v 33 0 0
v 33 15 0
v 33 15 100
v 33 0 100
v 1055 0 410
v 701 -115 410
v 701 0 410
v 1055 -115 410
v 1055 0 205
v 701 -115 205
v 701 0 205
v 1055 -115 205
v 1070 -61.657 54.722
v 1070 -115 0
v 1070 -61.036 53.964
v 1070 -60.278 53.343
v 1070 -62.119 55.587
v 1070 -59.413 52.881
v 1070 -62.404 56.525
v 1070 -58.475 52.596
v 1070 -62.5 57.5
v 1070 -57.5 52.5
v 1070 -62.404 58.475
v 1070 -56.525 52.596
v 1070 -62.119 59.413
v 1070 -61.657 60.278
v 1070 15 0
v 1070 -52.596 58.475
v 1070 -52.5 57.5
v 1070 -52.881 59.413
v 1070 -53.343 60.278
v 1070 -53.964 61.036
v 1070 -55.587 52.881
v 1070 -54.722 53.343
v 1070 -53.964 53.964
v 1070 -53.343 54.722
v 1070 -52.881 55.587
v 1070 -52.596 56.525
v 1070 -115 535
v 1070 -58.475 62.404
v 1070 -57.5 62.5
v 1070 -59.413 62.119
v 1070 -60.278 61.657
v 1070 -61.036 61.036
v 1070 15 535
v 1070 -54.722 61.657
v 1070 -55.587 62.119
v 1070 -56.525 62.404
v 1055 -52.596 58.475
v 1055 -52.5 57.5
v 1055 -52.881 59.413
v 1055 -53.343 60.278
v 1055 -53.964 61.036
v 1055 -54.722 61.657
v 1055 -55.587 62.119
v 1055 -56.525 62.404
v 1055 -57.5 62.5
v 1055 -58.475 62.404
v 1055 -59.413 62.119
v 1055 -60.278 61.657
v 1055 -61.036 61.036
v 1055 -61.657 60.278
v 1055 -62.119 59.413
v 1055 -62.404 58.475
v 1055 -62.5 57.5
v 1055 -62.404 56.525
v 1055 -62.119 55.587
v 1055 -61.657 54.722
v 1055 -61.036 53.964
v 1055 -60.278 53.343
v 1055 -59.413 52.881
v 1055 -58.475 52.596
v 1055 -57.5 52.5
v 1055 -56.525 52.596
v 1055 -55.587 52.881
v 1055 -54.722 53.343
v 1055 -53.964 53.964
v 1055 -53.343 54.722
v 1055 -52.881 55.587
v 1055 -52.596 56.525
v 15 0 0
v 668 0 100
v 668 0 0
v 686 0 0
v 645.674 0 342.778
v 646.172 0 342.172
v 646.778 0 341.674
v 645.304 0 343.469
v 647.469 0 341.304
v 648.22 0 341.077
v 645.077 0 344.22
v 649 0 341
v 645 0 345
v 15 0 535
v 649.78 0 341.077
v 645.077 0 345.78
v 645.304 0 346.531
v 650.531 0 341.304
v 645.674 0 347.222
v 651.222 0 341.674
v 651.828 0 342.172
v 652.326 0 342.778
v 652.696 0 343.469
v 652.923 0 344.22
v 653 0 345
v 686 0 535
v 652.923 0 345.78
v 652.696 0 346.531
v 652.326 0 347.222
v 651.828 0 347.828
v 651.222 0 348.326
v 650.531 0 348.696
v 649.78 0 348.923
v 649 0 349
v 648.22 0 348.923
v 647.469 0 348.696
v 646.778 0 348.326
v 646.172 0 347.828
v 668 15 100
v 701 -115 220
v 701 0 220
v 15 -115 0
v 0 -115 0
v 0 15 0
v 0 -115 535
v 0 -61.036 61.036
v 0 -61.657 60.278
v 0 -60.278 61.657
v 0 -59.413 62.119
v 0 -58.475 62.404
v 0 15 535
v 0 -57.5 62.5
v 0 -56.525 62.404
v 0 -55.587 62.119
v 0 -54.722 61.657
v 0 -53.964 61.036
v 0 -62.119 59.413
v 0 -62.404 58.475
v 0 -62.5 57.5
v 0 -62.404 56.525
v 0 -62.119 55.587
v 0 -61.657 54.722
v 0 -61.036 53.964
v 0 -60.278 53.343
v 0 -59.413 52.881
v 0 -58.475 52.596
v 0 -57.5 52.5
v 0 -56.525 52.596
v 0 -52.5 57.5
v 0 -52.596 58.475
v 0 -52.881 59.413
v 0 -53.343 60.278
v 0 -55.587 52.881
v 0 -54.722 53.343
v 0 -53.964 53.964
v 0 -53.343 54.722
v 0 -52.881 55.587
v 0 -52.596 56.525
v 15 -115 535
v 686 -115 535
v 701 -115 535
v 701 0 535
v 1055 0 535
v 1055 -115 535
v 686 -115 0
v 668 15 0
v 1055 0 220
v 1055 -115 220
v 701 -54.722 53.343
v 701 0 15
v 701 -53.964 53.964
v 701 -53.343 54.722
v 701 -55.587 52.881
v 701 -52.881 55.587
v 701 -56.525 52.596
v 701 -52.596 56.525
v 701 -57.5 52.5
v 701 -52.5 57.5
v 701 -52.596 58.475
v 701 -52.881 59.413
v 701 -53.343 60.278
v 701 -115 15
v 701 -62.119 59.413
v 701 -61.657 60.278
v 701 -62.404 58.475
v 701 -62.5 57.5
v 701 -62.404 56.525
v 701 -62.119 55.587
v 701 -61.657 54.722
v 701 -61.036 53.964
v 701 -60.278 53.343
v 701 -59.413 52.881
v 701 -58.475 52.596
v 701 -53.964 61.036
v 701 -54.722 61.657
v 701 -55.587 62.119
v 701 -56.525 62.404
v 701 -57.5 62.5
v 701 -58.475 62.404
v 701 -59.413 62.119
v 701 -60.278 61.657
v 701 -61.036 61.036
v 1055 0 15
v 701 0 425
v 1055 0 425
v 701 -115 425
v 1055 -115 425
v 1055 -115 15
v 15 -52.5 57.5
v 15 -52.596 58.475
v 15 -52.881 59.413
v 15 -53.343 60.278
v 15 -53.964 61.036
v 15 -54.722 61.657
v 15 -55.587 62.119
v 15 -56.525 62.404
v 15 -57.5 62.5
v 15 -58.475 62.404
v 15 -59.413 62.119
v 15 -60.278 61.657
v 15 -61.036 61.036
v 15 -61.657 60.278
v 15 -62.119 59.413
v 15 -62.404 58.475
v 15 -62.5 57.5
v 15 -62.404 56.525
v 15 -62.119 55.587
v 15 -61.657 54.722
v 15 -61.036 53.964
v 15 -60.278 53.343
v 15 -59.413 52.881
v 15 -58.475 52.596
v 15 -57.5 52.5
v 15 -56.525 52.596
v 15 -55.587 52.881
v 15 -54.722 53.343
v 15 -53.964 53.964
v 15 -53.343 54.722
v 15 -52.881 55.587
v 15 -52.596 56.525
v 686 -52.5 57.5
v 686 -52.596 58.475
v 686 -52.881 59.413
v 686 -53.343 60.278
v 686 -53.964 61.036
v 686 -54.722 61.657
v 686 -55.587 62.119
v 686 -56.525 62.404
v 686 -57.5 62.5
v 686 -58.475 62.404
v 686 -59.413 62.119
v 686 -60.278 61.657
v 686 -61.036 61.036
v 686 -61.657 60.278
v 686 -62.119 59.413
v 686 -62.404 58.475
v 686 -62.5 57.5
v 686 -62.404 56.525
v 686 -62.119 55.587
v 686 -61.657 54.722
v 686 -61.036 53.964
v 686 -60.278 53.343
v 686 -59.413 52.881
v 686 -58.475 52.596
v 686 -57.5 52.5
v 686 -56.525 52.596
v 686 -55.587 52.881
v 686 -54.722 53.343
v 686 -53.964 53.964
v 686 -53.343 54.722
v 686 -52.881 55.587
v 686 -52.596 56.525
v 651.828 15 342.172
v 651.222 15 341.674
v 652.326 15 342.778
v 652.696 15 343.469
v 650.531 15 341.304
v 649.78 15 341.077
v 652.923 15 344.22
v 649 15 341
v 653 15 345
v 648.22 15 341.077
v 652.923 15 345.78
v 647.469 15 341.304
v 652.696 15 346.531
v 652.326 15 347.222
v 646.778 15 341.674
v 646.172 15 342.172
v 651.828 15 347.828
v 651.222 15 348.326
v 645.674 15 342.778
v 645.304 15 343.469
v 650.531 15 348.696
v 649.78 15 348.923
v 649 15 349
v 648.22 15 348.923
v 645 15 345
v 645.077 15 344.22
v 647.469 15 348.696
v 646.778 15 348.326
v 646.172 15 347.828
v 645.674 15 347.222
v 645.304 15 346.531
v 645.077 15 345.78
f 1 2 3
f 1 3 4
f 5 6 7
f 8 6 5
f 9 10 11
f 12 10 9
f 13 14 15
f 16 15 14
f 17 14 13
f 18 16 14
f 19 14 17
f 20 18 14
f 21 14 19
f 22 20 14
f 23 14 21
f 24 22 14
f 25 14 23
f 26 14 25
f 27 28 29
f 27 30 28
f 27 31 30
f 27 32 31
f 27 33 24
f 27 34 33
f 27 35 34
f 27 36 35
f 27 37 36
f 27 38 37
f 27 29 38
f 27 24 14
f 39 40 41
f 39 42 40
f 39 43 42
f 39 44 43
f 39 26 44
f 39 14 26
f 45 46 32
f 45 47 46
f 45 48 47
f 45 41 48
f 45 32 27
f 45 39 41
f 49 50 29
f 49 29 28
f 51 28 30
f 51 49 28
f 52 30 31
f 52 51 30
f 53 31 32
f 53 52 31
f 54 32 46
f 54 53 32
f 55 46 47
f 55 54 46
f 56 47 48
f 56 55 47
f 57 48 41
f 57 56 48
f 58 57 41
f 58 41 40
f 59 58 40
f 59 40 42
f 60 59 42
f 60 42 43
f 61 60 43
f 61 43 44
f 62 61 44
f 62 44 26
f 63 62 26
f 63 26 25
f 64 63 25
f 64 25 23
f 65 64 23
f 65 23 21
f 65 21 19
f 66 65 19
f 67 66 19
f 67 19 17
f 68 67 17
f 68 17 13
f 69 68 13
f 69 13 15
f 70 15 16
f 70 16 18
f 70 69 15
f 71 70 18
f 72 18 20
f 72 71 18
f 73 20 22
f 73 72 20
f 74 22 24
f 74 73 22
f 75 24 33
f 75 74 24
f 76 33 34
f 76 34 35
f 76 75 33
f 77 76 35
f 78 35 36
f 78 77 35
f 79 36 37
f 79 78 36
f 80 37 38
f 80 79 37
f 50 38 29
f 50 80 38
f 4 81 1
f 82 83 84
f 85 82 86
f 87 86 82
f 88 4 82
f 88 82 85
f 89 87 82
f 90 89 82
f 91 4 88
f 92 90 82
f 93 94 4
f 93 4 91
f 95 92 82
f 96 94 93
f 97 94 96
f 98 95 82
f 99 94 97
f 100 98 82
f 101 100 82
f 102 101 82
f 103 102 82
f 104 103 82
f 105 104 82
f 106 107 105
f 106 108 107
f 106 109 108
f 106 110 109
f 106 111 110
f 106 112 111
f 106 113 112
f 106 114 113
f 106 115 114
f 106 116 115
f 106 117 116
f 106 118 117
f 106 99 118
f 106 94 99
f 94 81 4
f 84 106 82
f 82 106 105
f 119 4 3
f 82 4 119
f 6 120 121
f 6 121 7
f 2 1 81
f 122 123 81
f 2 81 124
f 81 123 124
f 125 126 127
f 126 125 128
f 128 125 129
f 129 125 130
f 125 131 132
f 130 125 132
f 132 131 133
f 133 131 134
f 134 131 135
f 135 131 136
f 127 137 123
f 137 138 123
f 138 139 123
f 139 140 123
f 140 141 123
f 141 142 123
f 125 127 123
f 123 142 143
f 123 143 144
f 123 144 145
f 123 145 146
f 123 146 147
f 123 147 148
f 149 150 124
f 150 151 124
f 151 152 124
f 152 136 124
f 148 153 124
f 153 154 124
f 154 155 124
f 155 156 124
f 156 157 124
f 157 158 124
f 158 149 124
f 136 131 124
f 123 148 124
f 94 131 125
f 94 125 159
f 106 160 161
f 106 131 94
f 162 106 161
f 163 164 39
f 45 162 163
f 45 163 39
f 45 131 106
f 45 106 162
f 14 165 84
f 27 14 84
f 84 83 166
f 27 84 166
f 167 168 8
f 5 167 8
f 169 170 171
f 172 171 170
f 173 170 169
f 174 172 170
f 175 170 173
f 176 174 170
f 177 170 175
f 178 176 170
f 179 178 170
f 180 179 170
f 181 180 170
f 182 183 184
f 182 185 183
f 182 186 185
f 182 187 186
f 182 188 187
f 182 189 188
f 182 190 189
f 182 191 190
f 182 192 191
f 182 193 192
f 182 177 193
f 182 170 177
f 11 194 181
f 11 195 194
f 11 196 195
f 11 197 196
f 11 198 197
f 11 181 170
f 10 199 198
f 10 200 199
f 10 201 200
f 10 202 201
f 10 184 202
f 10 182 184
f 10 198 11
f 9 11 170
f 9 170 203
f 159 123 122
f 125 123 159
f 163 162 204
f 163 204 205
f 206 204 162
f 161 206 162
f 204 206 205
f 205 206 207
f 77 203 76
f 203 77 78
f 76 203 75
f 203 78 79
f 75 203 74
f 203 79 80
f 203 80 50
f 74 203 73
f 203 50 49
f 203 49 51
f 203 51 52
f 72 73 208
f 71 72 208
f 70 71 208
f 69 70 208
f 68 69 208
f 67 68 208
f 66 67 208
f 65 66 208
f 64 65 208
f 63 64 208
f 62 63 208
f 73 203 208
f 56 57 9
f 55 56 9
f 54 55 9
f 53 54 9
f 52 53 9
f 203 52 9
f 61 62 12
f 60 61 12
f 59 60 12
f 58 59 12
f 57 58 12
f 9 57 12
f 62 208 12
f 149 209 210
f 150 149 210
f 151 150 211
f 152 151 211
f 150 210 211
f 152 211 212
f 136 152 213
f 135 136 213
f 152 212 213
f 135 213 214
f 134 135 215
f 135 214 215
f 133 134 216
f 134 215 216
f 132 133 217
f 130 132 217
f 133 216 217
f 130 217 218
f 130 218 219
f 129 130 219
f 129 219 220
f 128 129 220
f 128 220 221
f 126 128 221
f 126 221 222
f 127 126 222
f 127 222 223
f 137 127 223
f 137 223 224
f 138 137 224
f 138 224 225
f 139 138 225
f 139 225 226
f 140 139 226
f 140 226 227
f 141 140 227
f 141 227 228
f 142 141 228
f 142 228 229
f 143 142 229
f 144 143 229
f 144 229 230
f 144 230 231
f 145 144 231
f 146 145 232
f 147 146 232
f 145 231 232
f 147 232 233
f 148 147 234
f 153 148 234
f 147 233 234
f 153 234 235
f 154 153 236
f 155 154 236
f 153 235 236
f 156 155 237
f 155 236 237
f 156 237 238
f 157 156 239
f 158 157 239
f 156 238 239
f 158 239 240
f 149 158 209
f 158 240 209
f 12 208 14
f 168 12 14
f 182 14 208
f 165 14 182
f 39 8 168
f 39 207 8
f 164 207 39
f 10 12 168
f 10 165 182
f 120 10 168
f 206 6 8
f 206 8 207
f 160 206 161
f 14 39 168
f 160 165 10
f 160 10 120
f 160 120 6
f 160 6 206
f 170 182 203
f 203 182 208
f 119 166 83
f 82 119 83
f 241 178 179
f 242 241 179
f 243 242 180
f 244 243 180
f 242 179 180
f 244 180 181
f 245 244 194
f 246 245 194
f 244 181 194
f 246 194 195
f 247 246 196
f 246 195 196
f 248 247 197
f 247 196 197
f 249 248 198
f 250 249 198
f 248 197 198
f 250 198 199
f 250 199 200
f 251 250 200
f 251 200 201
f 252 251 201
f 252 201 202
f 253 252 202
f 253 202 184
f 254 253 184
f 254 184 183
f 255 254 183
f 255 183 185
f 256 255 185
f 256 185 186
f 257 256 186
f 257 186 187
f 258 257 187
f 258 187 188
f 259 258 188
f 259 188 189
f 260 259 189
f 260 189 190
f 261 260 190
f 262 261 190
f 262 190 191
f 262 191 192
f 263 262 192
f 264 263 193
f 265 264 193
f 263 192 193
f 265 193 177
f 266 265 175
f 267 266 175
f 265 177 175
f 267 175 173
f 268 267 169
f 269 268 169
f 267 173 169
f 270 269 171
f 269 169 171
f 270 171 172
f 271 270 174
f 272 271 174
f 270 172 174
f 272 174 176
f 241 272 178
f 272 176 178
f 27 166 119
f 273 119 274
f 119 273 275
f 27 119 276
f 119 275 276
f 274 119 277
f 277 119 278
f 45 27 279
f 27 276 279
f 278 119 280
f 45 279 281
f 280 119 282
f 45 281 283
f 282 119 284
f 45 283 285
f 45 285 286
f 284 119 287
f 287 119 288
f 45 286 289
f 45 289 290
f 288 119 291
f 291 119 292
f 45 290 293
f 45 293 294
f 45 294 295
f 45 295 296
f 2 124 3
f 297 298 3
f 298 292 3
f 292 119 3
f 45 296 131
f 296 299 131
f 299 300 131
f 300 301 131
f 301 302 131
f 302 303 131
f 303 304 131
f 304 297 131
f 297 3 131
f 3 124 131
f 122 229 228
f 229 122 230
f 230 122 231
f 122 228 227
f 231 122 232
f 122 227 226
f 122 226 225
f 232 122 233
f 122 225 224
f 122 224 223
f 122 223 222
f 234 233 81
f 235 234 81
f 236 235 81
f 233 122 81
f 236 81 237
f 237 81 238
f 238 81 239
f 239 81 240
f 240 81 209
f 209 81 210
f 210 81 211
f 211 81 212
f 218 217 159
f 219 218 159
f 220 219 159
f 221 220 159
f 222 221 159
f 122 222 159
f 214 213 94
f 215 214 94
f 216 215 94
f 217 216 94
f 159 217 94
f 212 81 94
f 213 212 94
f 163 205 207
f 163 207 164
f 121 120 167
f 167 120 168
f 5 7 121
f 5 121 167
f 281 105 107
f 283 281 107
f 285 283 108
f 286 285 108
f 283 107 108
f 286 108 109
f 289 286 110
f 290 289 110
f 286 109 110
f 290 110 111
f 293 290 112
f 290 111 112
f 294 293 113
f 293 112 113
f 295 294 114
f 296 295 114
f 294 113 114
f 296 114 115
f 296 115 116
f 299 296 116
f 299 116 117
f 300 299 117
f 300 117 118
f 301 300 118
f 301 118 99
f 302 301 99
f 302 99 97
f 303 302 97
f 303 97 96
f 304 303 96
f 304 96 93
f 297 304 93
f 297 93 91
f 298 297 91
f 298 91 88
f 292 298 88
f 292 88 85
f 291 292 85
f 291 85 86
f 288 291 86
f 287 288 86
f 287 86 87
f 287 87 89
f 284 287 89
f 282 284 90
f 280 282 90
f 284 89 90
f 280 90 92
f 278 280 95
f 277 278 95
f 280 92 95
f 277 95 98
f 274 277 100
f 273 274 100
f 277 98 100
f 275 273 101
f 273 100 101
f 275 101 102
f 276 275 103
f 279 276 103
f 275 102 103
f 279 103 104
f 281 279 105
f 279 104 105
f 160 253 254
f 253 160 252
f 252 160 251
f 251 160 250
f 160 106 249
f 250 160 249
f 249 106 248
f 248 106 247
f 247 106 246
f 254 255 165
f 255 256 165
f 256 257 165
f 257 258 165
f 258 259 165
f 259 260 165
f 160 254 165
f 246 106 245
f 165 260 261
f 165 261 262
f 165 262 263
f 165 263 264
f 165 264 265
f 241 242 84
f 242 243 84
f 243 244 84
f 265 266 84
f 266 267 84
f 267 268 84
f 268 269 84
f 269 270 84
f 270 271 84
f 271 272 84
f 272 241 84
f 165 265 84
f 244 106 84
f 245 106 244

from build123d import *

# Parameters (mm, degrees)
F0_W      = 701
F0_H      = 553
F1_DEPTH  = 15
F3_DEPTH  = 115
F5_D      = 10
F6_W      = 130
F6_H      = 553
F6_R      = 5
F7_DEPTH  = 369
F8_W      = 354
F8_H      = 113
F8_H_2    = 190
F9_DEPTH  = 115
F10_W     = 1070
F10_H     = 130
F11_DEPTH = 18
F12_W     = 635
F12_H     = 15
F13_DEPTH = 100
F15_D     = 8


with BuildPart() as f1:
    # F0 (on Front) → F1 (new body)
    with BuildSketch(Plane.XZ):
        with Locations((350.5, 276.5)):
            Rectangle(F0_W, F0_H)
    extrude(amount=-F1_DEPTH)

    # F2 (on face) → F3 (join)
    with BuildSketch(Plane.XZ):
        Polygon((0, 553), (0, 0), (15, 0), (15, 538), (686, 538), (686, 0), (701, 0), (701, 553), align=None)
    extrude(amount=F3_DEPTH)

    # F5 (through all)
    with Locations(Plane(origin=(0, 0, 0), x_dir=(0, -1, 0), z_dir=(-1, 0, 0))):
        with Locations((57.5, 57.5)):
            Hole(F5_D / 2)

    # F6 (on face) → F7 (join)
    with BuildSketch(Plane.YZ.offset(701)):
        with Locations((-50, 276.5)):
            Rectangle(F6_W, F6_H)
        with Locations((-57.5, 57.5)):
            Circle(F6_R, mode=Mode.SUBTRACT)
    extrude(amount=F7_DEPTH)

    # F8 (on face) → F9 (cut, through all)
    with BuildSketch(Plane.XZ.offset(115)):
        with Locations((878, 481.5)):
            Rectangle(F8_W, F8_H)
        with Locations((878, 315)):
            Rectangle(F8_W, F8_H_2)
        with Locations((878, 110)):
            Rectangle(F8_W, F8_H_2)
    extrude(amount=-F9_DEPTH, mode=Mode.SUBTRACT)

    # F10 (on face) → F11 (cut)
    with BuildSketch(Plane.XY.offset(553)):
        with Locations((535, -50)):
            Rectangle(F10_W, F10_H)
    extrude(amount=-F11_DEPTH, mode=Mode.SUBTRACT)

    # F12 (on face) → F13 (cut)
    with BuildSketch(Plane(origin=(0, 0, 0), x_dir=(1, 0, 0), z_dir=(0, 0, -1))):
        with Locations((350.5, -7.5)):
            Rectangle(F12_W, F12_H)
    extrude(amount=-F13_DEPTH, mode=Mode.SUBTRACT)

    # F15 (through all)
    with Locations(Plane(origin=(0, 15, 0), x_dir=(-1, 0, 0), z_dir=(0, 1, 0))):
        with Locations((-649, 345)):
            Hole(F15_D / 2)


solid = f1.part
